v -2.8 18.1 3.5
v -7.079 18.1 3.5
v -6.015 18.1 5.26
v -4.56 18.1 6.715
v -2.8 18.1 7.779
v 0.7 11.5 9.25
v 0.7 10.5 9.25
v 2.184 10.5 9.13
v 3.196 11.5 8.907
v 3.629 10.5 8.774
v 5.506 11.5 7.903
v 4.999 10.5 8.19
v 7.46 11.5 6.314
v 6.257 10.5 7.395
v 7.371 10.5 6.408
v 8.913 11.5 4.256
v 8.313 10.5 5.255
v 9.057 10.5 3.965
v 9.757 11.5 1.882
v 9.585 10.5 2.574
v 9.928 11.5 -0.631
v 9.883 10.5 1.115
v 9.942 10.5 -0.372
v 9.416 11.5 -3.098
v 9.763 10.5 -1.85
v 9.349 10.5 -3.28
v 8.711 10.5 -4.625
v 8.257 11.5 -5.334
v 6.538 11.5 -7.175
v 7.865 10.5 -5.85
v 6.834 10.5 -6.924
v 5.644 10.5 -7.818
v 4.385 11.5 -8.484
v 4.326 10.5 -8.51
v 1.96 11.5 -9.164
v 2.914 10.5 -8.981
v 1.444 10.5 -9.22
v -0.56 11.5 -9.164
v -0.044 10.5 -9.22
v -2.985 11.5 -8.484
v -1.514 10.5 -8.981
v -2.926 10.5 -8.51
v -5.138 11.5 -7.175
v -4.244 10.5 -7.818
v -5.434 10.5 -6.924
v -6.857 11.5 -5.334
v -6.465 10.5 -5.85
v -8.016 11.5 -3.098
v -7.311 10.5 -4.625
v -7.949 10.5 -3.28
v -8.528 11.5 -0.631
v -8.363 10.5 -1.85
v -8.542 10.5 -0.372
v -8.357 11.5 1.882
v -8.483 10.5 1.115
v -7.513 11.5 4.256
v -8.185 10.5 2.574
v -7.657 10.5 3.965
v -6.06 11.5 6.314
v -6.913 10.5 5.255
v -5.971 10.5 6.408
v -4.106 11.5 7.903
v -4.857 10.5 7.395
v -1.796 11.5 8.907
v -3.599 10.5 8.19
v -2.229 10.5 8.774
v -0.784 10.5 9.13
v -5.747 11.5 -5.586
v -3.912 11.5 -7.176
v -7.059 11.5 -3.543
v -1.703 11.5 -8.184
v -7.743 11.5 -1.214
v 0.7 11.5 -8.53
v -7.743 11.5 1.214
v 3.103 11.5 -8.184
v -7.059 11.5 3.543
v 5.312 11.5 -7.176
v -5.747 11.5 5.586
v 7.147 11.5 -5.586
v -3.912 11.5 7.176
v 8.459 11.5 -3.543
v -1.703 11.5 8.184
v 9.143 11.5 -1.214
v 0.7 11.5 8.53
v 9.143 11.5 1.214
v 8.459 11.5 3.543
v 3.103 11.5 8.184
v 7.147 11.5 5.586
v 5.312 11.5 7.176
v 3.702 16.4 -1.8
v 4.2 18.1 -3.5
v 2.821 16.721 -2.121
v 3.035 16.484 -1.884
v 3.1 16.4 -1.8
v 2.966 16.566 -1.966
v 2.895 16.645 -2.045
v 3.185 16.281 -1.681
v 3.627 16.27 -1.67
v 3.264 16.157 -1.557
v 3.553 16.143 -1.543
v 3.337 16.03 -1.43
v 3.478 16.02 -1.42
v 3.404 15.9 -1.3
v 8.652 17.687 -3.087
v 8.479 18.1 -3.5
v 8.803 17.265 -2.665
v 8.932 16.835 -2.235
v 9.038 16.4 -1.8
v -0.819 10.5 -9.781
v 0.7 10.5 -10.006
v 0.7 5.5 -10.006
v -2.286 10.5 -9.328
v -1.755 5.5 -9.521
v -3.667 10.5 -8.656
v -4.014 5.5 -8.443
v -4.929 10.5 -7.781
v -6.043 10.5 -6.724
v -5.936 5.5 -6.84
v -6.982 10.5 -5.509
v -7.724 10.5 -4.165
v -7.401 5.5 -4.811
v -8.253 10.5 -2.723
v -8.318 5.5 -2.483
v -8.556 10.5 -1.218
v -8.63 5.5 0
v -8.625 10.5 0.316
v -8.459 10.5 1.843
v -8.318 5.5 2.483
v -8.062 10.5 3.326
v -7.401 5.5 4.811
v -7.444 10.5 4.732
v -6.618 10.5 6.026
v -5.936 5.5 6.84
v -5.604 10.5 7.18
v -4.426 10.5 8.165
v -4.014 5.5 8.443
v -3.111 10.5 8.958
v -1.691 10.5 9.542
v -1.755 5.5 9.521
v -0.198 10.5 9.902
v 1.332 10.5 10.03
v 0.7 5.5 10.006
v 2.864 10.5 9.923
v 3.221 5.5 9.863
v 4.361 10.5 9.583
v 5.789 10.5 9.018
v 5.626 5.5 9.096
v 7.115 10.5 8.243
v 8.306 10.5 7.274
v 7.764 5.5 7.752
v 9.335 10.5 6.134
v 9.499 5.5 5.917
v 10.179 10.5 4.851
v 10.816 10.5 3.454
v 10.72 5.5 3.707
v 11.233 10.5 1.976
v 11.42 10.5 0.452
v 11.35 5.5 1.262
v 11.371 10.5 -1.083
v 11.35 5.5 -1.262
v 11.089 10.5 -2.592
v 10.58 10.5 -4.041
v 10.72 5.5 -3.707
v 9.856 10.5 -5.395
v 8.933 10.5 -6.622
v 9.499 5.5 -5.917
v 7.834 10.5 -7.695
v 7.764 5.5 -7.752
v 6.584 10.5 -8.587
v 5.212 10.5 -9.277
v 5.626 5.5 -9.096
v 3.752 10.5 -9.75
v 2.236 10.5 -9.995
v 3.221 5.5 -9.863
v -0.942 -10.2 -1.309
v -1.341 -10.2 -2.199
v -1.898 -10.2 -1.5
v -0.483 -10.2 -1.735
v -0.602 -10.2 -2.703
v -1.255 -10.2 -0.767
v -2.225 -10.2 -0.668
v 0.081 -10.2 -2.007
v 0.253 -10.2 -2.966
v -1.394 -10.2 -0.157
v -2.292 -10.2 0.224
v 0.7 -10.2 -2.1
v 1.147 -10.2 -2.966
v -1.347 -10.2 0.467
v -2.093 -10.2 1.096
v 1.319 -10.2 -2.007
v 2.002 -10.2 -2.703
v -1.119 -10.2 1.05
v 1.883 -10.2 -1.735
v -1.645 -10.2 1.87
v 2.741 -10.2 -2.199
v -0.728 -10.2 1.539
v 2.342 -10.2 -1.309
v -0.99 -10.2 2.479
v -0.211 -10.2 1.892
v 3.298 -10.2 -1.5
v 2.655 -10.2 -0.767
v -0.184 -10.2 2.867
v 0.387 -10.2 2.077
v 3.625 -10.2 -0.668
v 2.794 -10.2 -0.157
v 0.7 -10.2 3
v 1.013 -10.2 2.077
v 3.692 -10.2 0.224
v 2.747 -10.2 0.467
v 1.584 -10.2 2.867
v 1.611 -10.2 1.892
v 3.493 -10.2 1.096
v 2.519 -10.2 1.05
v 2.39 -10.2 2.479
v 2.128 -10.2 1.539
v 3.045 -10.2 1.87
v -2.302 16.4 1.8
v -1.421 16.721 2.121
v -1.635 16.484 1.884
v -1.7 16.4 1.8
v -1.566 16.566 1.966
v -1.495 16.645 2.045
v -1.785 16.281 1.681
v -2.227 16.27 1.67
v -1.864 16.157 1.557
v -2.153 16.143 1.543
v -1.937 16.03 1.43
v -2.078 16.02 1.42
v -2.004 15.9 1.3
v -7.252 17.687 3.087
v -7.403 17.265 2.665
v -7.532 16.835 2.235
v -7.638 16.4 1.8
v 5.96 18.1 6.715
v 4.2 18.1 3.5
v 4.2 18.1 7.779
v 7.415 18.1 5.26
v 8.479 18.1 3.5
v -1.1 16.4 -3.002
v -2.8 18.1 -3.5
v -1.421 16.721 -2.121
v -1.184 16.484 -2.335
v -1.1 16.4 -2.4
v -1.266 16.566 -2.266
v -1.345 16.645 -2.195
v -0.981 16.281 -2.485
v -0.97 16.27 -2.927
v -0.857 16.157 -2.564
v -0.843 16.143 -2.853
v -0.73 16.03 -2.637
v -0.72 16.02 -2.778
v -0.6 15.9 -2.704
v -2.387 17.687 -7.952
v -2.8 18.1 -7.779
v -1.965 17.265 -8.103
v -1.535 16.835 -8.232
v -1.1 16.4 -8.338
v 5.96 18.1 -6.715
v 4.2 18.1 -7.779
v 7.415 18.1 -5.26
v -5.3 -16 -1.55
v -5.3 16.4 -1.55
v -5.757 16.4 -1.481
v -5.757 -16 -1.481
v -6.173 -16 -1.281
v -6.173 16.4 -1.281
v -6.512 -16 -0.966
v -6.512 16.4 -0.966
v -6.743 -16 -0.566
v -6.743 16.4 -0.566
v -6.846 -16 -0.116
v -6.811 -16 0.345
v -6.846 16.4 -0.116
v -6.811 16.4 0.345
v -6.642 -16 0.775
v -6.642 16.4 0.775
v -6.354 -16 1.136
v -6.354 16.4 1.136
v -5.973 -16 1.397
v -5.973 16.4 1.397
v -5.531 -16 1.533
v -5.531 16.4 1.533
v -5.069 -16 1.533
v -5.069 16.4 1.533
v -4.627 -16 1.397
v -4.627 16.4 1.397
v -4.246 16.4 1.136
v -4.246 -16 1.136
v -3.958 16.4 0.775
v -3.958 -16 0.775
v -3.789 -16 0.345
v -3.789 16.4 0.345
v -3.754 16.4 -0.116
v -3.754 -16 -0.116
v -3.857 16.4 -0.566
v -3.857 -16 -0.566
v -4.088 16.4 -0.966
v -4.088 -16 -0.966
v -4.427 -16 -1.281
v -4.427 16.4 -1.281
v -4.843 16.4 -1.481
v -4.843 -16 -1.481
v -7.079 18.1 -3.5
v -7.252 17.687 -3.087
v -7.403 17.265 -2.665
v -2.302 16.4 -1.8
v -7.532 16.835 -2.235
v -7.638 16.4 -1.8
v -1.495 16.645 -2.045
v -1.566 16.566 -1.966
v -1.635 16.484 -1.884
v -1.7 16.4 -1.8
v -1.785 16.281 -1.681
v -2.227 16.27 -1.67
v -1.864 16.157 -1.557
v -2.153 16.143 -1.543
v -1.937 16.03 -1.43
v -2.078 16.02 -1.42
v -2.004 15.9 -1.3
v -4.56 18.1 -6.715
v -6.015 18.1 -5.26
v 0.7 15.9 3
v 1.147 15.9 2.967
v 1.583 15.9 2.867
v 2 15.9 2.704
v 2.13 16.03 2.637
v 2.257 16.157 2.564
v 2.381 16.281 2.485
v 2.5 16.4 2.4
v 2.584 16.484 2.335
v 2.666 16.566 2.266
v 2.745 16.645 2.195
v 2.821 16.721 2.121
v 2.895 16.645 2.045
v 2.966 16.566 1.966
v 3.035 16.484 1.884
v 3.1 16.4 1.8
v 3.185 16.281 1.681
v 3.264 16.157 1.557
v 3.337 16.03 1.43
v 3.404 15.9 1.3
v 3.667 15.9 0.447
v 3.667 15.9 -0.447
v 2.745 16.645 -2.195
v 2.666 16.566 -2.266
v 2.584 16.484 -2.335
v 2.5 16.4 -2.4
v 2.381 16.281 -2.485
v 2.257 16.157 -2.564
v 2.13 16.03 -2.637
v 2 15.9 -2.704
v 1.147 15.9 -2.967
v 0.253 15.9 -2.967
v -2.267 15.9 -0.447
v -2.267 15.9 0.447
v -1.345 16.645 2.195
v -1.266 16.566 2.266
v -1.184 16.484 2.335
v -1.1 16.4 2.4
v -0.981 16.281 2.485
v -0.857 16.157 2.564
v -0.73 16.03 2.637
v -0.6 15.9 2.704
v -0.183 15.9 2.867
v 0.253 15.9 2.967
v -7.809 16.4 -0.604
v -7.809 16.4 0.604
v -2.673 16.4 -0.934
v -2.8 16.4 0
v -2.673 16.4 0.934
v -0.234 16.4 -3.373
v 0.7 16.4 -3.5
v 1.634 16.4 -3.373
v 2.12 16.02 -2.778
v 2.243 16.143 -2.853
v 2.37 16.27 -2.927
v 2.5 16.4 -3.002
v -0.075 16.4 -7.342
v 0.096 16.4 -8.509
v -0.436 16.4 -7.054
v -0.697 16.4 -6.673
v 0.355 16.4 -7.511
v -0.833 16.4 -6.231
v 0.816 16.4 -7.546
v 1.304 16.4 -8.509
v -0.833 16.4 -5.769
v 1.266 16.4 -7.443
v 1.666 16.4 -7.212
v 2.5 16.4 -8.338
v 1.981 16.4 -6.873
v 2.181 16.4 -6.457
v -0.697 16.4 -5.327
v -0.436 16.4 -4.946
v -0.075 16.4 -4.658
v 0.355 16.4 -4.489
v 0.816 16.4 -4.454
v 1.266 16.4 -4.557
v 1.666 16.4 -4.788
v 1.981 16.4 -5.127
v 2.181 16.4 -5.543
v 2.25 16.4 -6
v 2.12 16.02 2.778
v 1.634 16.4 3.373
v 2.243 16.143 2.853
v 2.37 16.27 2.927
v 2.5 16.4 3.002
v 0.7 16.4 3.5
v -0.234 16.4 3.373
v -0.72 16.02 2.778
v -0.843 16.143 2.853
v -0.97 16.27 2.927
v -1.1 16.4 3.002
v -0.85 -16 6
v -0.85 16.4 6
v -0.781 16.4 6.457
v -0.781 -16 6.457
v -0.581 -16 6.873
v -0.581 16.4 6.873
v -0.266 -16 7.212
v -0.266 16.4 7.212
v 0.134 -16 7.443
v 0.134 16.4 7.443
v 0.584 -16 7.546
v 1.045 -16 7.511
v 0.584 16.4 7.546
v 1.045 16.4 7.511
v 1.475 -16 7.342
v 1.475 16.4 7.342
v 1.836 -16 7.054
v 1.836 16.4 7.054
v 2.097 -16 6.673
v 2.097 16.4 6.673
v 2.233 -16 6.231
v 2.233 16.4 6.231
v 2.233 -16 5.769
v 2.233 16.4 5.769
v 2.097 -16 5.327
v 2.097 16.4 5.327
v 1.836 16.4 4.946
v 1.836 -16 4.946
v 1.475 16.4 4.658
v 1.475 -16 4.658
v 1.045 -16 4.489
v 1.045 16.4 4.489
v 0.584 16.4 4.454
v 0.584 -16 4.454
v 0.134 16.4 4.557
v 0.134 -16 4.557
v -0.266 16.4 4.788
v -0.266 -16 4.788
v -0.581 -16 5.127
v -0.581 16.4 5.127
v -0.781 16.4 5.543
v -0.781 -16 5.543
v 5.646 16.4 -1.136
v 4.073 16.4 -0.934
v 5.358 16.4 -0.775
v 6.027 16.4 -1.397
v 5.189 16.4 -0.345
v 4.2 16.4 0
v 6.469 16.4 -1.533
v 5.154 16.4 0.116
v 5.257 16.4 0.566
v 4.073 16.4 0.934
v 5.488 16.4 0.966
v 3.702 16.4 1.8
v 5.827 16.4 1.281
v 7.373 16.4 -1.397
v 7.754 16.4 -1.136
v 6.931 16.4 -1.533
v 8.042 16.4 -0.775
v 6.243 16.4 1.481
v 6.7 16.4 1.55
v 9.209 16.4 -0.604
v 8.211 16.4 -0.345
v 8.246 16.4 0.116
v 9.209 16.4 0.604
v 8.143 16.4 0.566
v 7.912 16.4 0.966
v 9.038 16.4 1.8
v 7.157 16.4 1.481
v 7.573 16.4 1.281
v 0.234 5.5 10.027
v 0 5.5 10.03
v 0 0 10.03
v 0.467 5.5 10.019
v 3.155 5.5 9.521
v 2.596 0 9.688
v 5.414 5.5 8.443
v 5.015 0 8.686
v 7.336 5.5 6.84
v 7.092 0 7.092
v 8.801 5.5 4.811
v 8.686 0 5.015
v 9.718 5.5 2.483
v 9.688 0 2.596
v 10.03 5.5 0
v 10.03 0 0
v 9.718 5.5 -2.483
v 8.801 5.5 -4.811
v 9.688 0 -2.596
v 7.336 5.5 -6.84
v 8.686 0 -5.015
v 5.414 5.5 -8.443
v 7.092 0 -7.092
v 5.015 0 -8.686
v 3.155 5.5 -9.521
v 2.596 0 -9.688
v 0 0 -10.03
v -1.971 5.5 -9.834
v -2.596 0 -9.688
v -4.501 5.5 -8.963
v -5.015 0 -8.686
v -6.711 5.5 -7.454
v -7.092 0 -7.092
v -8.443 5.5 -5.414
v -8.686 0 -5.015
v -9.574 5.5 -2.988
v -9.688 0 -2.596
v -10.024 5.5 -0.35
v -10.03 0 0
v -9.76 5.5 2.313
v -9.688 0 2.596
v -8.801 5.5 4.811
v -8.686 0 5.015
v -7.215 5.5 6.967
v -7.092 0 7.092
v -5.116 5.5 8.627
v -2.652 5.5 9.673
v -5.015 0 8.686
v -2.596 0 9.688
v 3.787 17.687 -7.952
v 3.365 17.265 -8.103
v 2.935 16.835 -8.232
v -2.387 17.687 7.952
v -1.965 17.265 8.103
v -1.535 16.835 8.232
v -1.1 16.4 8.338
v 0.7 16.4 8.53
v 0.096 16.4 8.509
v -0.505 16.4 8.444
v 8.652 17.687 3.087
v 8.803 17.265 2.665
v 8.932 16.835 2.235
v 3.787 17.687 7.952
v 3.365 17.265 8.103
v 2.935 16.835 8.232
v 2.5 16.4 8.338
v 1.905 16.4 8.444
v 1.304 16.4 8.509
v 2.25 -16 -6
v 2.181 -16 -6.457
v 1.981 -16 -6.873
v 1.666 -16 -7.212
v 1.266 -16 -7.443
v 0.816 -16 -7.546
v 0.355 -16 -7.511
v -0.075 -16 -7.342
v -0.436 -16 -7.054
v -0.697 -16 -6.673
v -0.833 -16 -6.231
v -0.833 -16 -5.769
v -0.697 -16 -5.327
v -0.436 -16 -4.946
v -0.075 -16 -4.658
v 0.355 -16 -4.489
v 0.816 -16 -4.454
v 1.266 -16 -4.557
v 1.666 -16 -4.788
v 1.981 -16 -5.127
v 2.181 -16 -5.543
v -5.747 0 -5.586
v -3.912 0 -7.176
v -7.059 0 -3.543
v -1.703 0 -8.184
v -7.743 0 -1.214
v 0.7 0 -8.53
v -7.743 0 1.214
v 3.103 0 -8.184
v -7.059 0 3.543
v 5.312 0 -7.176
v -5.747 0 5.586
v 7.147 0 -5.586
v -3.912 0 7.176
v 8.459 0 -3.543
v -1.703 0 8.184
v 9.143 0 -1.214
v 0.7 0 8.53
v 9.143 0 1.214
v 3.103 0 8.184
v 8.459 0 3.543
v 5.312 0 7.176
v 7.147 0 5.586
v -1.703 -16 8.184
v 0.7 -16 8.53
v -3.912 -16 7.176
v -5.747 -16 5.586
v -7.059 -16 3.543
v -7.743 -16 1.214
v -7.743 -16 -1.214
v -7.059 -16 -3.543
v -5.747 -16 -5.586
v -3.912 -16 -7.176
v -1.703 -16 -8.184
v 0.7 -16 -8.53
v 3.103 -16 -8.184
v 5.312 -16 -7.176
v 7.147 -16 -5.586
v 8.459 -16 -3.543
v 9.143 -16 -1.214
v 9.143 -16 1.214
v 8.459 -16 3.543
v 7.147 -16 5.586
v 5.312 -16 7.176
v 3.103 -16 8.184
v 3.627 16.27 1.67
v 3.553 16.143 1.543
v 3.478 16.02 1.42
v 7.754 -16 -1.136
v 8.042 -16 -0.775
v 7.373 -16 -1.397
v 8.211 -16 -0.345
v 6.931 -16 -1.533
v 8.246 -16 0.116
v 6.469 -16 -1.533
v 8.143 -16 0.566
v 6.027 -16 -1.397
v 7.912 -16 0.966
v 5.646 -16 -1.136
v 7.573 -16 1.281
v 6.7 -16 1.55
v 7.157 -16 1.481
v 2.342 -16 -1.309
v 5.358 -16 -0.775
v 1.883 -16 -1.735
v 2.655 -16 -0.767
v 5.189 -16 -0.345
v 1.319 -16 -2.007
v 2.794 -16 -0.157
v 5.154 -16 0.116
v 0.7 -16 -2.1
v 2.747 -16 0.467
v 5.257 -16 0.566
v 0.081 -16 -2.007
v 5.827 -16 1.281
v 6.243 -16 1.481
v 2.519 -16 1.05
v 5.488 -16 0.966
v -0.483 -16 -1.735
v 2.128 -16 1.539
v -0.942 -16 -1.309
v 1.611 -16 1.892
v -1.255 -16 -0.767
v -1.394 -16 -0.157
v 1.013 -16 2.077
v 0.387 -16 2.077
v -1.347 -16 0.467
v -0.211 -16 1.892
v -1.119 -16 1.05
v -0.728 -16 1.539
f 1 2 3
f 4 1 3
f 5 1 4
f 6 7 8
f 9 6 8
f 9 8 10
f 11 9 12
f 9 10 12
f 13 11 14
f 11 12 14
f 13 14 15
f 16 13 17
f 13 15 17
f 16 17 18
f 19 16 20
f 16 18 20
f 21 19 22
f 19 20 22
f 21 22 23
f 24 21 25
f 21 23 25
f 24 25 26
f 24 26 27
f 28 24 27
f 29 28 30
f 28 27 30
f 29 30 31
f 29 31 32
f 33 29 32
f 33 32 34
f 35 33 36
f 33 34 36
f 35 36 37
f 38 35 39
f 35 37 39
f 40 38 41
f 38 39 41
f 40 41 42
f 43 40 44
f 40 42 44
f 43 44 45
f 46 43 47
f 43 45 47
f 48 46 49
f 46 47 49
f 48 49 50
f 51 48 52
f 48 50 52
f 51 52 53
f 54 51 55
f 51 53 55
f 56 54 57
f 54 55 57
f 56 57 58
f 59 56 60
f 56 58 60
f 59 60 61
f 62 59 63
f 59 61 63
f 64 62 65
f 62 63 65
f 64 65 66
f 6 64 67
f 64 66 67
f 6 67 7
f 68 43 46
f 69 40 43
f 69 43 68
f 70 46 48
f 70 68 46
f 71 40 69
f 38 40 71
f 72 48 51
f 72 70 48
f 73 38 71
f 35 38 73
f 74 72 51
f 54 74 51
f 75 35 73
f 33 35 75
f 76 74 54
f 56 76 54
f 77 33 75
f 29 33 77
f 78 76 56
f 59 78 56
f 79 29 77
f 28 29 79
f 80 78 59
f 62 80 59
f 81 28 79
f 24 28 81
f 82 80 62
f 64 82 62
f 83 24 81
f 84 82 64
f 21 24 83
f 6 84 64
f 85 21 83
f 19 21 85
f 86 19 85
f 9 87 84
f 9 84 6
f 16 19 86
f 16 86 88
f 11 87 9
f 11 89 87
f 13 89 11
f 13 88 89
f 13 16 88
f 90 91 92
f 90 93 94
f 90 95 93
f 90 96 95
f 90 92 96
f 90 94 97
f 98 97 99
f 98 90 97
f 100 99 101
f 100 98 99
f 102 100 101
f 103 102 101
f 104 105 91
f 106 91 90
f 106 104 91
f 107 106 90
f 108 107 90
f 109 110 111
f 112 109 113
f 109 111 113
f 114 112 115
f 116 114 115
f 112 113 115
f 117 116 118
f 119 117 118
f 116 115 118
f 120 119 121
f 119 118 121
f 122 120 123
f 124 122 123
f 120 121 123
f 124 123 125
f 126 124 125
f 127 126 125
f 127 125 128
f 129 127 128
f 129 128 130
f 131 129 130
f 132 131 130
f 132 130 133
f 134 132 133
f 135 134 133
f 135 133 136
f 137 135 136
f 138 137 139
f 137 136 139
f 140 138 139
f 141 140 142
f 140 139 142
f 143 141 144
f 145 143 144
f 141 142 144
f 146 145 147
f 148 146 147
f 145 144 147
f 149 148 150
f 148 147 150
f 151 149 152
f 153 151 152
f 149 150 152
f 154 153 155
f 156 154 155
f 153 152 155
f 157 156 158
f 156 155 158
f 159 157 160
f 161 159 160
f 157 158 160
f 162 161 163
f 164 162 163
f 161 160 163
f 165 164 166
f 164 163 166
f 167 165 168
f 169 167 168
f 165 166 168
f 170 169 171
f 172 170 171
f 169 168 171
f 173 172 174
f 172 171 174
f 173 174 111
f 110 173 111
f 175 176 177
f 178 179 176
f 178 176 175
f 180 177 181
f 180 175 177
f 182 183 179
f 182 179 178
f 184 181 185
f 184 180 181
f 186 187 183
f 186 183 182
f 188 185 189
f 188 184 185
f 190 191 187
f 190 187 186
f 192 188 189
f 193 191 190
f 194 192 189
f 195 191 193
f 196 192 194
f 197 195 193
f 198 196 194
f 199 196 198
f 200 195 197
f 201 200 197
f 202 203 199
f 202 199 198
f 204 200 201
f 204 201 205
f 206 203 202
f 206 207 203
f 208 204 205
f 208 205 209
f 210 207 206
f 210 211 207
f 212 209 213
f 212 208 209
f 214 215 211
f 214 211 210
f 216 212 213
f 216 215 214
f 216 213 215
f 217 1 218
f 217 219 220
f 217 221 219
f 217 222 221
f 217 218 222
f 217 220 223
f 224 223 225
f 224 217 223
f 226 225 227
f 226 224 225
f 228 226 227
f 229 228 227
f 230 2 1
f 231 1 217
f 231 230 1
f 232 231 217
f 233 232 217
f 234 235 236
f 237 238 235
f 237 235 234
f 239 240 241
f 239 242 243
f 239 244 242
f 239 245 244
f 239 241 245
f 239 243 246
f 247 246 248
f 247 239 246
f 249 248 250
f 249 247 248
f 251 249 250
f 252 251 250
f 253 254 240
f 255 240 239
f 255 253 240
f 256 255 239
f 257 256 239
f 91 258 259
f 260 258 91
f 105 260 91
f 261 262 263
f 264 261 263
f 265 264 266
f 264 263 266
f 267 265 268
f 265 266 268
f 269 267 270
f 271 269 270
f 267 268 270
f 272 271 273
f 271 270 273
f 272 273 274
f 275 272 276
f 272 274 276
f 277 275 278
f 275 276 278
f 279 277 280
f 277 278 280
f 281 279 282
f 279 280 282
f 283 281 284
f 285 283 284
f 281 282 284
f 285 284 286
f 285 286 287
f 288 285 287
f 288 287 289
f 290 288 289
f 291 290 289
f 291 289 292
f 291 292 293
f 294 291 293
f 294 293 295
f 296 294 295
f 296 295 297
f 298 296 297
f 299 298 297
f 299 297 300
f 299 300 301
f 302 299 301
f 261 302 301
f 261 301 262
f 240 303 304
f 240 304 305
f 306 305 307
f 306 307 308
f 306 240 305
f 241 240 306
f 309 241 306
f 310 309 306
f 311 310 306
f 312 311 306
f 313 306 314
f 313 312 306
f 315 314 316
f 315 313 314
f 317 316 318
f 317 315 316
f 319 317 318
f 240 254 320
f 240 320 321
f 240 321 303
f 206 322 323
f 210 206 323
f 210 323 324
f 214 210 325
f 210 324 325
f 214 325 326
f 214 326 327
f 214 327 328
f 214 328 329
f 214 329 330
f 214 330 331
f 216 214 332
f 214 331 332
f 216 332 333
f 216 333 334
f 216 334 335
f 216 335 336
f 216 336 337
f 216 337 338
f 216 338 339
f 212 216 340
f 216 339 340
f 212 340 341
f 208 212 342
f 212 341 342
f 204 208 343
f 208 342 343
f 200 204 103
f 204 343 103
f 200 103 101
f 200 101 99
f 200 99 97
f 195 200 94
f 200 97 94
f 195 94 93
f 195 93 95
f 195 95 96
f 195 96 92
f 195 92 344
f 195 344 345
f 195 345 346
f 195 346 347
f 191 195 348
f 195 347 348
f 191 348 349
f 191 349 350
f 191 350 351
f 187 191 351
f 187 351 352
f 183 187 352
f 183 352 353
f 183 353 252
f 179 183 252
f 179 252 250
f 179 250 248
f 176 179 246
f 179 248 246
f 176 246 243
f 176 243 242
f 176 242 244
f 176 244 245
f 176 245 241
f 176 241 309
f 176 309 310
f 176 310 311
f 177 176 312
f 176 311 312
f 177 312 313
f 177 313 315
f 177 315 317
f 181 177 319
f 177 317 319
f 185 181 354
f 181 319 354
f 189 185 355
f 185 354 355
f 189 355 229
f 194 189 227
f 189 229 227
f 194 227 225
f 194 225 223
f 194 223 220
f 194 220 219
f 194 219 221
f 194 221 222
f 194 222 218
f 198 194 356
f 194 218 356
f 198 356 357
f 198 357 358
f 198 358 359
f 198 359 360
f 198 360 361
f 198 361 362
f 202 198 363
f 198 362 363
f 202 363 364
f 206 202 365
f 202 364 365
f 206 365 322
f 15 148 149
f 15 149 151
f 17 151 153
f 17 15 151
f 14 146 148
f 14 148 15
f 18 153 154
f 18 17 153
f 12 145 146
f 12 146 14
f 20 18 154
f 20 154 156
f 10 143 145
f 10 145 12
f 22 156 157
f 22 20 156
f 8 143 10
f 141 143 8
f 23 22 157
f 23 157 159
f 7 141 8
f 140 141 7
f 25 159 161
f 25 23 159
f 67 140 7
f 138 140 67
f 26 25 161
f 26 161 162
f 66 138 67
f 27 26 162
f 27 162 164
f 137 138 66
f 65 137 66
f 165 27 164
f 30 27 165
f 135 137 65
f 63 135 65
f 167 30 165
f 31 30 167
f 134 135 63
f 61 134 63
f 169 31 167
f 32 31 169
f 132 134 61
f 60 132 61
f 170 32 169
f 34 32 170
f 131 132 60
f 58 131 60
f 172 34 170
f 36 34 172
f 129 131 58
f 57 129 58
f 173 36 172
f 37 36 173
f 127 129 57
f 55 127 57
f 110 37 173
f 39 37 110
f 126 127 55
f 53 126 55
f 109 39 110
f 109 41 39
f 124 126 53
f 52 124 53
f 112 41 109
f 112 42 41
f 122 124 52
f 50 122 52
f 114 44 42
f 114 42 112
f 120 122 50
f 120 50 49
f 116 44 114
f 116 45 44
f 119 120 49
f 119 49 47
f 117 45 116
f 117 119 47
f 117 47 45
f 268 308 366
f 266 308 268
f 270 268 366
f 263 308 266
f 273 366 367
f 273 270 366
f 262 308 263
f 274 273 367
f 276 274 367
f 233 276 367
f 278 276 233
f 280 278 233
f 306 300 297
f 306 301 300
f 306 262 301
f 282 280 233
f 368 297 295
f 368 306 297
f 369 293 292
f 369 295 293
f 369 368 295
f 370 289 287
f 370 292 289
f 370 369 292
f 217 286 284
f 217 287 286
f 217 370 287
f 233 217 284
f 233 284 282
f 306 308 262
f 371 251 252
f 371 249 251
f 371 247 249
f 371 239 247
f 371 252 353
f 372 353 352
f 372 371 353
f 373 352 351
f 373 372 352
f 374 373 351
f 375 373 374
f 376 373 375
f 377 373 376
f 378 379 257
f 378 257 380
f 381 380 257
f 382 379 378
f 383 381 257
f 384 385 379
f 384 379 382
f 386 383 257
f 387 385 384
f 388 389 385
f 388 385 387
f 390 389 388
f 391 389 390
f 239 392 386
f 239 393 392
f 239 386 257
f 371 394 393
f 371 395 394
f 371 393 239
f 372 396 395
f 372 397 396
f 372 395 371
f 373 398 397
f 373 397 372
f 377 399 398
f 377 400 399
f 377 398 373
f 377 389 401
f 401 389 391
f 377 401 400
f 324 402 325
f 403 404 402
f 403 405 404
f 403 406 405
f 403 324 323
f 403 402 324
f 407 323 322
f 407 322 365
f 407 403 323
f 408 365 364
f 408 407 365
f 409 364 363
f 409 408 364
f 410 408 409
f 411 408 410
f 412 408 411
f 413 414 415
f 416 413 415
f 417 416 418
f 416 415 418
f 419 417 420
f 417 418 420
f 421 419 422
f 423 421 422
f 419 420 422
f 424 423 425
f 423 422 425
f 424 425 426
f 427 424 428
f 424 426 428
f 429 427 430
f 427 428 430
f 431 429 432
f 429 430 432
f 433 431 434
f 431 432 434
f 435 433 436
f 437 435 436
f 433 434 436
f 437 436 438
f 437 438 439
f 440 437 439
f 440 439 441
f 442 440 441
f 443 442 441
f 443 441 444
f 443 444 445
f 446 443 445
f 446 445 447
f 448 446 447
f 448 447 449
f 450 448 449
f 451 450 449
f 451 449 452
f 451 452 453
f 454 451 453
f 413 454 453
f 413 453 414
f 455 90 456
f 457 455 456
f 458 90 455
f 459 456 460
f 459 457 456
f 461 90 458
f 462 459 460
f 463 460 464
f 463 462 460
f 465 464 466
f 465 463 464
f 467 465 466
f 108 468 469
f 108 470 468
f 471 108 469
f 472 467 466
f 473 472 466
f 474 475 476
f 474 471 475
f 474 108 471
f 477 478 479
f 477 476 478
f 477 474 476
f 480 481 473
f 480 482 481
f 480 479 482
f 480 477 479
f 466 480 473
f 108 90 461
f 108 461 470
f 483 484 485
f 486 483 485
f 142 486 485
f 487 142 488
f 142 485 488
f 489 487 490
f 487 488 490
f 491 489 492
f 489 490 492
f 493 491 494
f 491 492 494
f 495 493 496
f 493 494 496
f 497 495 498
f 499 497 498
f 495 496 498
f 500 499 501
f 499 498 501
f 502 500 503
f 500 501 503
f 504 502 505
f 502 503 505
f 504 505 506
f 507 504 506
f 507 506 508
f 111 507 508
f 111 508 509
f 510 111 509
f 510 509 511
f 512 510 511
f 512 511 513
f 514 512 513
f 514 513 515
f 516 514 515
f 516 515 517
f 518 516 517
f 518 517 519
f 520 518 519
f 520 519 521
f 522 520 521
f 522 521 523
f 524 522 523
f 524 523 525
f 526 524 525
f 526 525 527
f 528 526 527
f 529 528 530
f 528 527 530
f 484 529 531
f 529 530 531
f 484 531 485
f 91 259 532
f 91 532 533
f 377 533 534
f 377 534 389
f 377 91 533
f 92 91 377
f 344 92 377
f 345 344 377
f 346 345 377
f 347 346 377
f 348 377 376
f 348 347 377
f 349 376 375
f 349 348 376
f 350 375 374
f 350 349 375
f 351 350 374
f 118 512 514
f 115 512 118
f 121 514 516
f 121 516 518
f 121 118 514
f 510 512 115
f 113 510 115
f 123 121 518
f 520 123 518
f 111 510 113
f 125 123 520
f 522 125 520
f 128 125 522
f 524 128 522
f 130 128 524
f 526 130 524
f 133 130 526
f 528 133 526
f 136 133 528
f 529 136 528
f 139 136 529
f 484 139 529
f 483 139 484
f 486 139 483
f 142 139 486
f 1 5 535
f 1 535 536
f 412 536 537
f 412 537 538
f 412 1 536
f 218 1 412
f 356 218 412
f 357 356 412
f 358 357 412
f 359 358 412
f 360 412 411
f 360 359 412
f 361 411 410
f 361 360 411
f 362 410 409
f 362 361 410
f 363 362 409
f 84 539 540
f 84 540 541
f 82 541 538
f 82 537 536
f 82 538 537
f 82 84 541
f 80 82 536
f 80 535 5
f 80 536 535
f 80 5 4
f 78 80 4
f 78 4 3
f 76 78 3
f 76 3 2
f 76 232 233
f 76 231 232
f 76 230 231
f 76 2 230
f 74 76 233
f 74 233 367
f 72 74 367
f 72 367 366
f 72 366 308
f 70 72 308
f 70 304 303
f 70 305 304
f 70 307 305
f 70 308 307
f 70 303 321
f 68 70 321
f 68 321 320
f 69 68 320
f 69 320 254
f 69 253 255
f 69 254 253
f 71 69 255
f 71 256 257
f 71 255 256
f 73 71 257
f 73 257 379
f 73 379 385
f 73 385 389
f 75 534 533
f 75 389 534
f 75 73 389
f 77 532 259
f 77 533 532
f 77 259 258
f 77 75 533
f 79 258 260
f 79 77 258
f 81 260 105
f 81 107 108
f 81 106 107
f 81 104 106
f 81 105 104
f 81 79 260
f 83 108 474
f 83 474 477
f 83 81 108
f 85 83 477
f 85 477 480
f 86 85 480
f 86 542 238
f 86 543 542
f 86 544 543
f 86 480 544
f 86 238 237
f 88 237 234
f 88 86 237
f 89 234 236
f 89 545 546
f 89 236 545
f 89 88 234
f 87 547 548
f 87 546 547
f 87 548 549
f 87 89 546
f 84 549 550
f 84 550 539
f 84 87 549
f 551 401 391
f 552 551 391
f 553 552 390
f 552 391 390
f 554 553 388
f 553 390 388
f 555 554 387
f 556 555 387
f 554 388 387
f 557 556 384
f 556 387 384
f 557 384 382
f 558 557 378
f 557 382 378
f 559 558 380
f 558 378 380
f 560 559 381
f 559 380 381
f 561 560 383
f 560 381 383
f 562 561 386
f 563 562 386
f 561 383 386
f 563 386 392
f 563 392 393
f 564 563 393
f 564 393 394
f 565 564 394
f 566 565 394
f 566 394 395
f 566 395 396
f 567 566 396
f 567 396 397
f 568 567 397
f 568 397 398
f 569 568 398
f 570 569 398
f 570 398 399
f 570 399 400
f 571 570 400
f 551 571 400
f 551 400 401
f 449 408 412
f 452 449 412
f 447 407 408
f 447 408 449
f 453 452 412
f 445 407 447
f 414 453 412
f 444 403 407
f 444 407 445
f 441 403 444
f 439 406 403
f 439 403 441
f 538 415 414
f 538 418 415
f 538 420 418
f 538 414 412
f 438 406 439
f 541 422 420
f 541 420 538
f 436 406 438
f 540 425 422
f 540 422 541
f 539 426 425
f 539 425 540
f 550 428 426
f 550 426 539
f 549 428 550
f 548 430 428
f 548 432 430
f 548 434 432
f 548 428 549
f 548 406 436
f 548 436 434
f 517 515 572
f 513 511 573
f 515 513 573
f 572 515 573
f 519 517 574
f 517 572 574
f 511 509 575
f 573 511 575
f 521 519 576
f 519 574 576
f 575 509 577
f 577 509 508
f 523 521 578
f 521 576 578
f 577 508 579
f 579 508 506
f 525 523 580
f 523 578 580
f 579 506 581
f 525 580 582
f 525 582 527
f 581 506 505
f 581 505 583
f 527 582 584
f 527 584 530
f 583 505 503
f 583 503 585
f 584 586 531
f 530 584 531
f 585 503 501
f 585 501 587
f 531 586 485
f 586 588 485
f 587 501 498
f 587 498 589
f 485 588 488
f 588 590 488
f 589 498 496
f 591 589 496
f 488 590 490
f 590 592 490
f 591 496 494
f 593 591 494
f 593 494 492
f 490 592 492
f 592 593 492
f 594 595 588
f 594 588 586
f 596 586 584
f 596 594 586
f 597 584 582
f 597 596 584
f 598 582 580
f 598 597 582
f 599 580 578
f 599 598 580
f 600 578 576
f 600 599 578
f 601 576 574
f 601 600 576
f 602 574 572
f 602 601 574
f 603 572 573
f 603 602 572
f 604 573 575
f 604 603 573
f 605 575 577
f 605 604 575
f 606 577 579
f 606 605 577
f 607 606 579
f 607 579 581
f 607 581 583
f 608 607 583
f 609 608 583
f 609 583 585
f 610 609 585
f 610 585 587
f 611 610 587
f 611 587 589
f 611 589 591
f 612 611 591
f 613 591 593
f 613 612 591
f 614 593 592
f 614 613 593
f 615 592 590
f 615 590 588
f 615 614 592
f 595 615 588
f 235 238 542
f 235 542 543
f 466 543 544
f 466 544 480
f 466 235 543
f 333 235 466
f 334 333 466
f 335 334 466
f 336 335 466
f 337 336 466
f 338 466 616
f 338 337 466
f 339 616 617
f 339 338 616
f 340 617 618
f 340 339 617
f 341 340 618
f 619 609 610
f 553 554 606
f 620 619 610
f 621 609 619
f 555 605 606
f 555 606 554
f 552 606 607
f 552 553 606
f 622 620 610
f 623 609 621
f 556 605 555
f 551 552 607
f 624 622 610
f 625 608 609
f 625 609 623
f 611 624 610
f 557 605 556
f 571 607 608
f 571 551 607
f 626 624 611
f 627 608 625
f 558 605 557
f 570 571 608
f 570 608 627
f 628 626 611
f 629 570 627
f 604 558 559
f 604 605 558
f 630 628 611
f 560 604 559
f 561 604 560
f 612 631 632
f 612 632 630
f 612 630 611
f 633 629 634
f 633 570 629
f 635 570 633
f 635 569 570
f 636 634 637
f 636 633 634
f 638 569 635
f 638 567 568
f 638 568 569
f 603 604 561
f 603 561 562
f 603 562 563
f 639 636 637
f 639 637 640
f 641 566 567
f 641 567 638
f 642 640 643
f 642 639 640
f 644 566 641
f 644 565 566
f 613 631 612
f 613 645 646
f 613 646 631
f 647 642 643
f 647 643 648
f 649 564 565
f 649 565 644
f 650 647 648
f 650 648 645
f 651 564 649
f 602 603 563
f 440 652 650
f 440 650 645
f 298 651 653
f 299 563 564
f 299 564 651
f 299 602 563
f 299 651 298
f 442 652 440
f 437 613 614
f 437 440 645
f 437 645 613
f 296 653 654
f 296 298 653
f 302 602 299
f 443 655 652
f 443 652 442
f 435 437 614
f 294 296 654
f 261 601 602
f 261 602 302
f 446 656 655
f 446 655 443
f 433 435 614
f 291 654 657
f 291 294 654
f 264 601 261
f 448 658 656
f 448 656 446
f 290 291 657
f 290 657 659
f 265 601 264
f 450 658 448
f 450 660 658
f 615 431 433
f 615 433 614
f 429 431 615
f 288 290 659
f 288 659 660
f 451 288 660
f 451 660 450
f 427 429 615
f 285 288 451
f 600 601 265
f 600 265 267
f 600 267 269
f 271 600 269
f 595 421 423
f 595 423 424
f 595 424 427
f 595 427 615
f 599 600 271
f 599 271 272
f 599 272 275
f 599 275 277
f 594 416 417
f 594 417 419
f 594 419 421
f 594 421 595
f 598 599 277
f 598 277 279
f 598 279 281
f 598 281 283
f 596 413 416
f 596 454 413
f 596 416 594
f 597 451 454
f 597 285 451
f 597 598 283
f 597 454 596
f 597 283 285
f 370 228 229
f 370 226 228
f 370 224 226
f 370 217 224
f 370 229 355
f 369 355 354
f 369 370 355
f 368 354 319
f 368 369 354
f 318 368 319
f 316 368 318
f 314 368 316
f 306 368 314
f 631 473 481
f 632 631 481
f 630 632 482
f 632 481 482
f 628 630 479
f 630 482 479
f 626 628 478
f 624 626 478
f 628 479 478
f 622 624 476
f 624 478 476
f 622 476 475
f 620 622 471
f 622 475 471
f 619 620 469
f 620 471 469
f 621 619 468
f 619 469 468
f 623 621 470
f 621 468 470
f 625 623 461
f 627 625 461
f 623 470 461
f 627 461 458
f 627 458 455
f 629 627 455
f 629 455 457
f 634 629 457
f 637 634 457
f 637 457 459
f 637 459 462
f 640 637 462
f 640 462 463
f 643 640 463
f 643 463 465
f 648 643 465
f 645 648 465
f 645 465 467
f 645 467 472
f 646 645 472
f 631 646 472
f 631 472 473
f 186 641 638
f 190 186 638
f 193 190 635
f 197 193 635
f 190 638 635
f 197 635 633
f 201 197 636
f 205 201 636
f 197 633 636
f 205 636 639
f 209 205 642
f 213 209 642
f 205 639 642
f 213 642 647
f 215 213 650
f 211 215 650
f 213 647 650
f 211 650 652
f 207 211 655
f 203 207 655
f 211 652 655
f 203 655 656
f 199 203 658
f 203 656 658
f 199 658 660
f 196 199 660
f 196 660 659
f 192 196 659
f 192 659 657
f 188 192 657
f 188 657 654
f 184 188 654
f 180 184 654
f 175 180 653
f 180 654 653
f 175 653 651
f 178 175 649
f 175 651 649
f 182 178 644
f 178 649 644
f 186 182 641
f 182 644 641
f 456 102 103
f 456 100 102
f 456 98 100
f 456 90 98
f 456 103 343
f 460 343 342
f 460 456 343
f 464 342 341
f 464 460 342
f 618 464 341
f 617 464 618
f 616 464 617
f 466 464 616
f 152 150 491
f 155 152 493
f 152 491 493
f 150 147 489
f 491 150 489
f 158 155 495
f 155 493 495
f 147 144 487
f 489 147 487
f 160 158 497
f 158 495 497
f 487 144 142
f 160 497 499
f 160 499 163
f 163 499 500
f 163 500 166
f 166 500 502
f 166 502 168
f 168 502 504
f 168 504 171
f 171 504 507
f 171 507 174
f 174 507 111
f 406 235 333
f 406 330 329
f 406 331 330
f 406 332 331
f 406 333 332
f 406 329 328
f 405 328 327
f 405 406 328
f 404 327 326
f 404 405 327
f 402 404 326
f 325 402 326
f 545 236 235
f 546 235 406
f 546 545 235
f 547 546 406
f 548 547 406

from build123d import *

# Parameters (mm, degrees)
SKETCH1_R            = 10.03
BOSS_EXTRUDE11_DEPTH = 5.5
SKETCH20_R           = 10.03
BOSS_EXTRUDE12_DEPTH = 5
SKETCH21_R           = 9.25
BOSS_EXTRUDE13_DEPTH = 1
SKETCH22_R           = 8.53
BOSS_EXTRUDE14_DEPTH = 6.6
BOSS_EXTRUDE15_START = 16
SKETCH30_R           = 8.53
BOSS_EXTRUDE15_DEPTH = 16
SKETCH31_R           = 1.55
CUT_EXTRUDE12_DEPTH  = 34.1
SKETCH33_R           = 2.1
CUT_EXTRUDE14_DEPTH  = 5.8
SKETCH36_R           = 3
CUT_EXTRUDE18_DEPTH  = 28.3
SKETCH37_W           = 9.5
SKETCH37_H           = 7
CUT_EXTRUDE19_DEPTH  = 1.7
CIRPATTERN1_COUNT    = 4
CHAMFER1_SIZE        = 1.7
CHAMFER2_SIZE        = 0.5


with BuildPart() as part:
    # Sketch1 → Boss-Extrude11 (new body)
    with BuildSketch(Plane(origin=(0, 0, 0), x_dir=(1, 0, 0), z_dir=(0, 1, 0))):
        with Locations(Location((0, 0, 0), (0, 0, 270))):
            Circle(SKETCH1_R)
    extrude(amount=BOSS_EXTRUDE11_DEPTH)

    # Sketch20 → Boss-Extrude12 (add)
    with BuildSketch(Plane(origin=(0, 5.5, 0), x_dir=(1, 0, 0), z_dir=(0, 1, 0))):
        with Locations(Location((1.4, 0, 0), (0, 0, 94.001961682))):
            Circle(SKETCH20_R)
    extrude(amount=BOSS_EXTRUDE12_DEPTH)

    # Sketch21 → Boss-Extrude13 (add)
    with BuildSketch(Plane(origin=(0, 10.5, 0), x_dir=(1, 0, 0), z_dir=(0, 1, 0))):
        with Locations(Location((0.7, 0, 0), (0, 0, 270))):
            Circle(SKETCH21_R)
    extrude(amount=BOSS_EXTRUDE13_DEPTH)

    # Sketch22 → Boss-Extrude14 (add)
    with BuildSketch(Plane(origin=(0, 11.5, 0), x_dir=(1, 0, 0), z_dir=(0, 1, 0))):
        with Locations(Location((0.7, 0, 0), (0, 0, 270))):
            Circle(SKETCH22_R)
    extrude(amount=BOSS_EXTRUDE14_DEPTH)

    # Sketch30 → Boss-Extrude15 (add)
    with BuildSketch(Plane.XZ.offset(BOSS_EXTRUDE15_START)):
        with Locations(Location((0.7, 0, 0), (0, 0, 90))):
            Circle(SKETCH30_R)
    extrude(amount=-BOSS_EXTRUDE15_DEPTH)

    # Sketch31 → Cut-Extrude12 (cut)
    with BuildSketch(Plane(origin=(0, 18.1, 0), x_dir=(1, 0, 0), z_dir=(0, 1, 0))):
        with Locations(Location((6.7, 0, 0), (0, 0, 270))):
            Circle(SKETCH31_R)
    cut_extrude12 = extrude(amount=-CUT_EXTRUDE12_DEPTH, mode=Mode.SUBTRACT)

    # Sketch33 → Cut-Extrude14 (cut)
    with BuildSketch(Plane.XZ.offset(16)):
        with Locations(Location((0.7, 0, 0), (0, 0, 270))):
            Circle(SKETCH33_R)
    extrude(amount=-CUT_EXTRUDE14_DEPTH, mode=Mode.SUBTRACT)

    # Sketch36 → Cut-Extrude18 (cut)
    with BuildSketch(Plane(origin=(0, 18.1, 0), x_dir=(1, 0, 0), z_dir=(0, 1, 0))):
        with Locations(Location((0.7, 0, 0), (0, 0, 270))):
            Circle(SKETCH36_R)
    extrude(amount=-CUT_EXTRUDE18_DEPTH, mode=Mode.SUBTRACT)

    # Sketch37 → Cut-Extrude19 (cut)
    with BuildSketch(Plane(origin=(0, 18.1, 0), x_dir=(1, 0, 0), z_dir=(0, 1, 0))):
        with Locations((5.45, 0)):
            Rectangle(SKETCH37_W, SKETCH37_H)
    cut_extrude19 = extrude(amount=-CUT_EXTRUDE19_DEPTH, mode=Mode.SUBTRACT)

    # CirPattern1: Cut-Extrude12, Cut-Extrude19 ×4 about axis
    cirpattern1_axis = Axis((0.7, 0, 0), (0, 1, 0))
    add([cut_extrude12.rotate(cirpattern1_axis, i * 360 / CIRPATTERN1_COUNT) for i in range(1, CIRPATTERN1_COUNT)], mode=Mode.SUBTRACT)
    add([cut_extrude19.rotate(cirpattern1_axis, i * 360 / CIRPATTERN1_COUNT) for i in range(1, CIRPATTERN1_COUNT)], mode=Mode.SUBTRACT)

    # Chamfer1
    # the kernel refuses this chamfer: 1.7 mm, written as the material it adds along each edge
    with BuildSketch(Plane(origin=(12.85073632, 16.4, -3.5), x_dir=(0, 0.9996219169112968, -0.027495876610586365), z_dir=(-1, 0, 0))) as chamfer1_piece_1_section:
        Polygon((CHAMFER1_SIZE * 0.999621916911, -CHAMFER1_SIZE * 0.0274958766106), (-CHAMFER1_SIZE * 0.0274958766106, -CHAMFER1_SIZE * 0.999621916911), (0, 0), align=None)
    chamfer1_piece_1 = extrude(amount=8.65073632, mode=Mode.PRIVATE)
    chamfer1_piece_1 = chamfer1_piece_1 & Plane(origin=(0.7, 16.951076754, 0), x_dir=(0, 0, 1), z_dir=(0, -1, 0)) * Cylinder(8.53, 25, mode=Mode.PRIVATE)
    chamfer1_piece_1 = split(chamfer1_piece_1, bisect_by=Plane(origin=(6.450066767, 18.1, -2.924017163), z_dir=(0, -1, 0)), keep=Keep.TOP, mode=Mode.PRIVATE)
    add(chamfer1_piece_1)
    with BuildSketch(Plane(origin=(4.2, 16.4, 3.5), x_dir=(0, 0.9996219169112968, 0.027495876610581792), z_dir=(1, 0, 0))) as chamfer1_piece_2_section:
        Polygon((CHAMFER1_SIZE * 0.999621916911, -CHAMFER1_SIZE * 0.0274958766106), (-CHAMFER1_SIZE * 0.0274958766106, -CHAMFER1_SIZE * 0.999621916911), (0, 0), align=None)
    chamfer1_piece_2 = extrude(amount=8.65073632, mode=Mode.PRIVATE)
    chamfer1_piece_2 = chamfer1_piece_2 & Plane(origin=(0.7, 16.951076754, 0), x_dir=(0, 0, 1), z_dir=(0, -1, 0)) * Cylinder(8.53, 25, mode=Mode.PRIVATE)
    chamfer1_piece_2 = split(chamfer1_piece_2, bisect_by=Plane(origin=(6.450066768, 18.1, 2.924017163), z_dir=(0, -1, 0)), keep=Keep.TOP, mode=Mode.PRIVATE)
    add(chamfer1_piece_2)
    with BuildSketch(Plane(origin=(-2.8, 16.4, -12.15073632), x_dir=(-0.027495876610586365, 0.9996219169112968, 0), z_dir=(0, 0, 1))) as chamfer1_piece_3_section:
        Polygon((CHAMFER1_SIZE * 0.999621916911, -CHAMFER1_SIZE * 0.0274958766106), (-CHAMFER1_SIZE * 0.0274958766106, -CHAMFER1_SIZE * 0.999621916911), (0, 0), align=None)
    chamfer1_piece_3 = extrude(amount=8.65073632, mode=Mode.PRIVATE)
    chamfer1_piece_3 = chamfer1_piece_3 & Plane(origin=(0.7, 16.951076754, 0), x_dir=(0, 0, 1), z_dir=(0, -1, 0)) * Cylinder(8.53, 25, mode=Mode.PRIVATE)
    chamfer1_piece_3 = split(chamfer1_piece_3, bisect_by=Plane(origin=(-2.224017163, 18.1, -5.750066767), z_dir=(0, -1, 0)), keep=Keep.TOP, mode=Mode.PRIVATE)
    add(chamfer1_piece_3)
    with BuildSketch(Plane(origin=(-2.8, 16.4, -3.5), x_dir=(0, 0.9996219169112968, -0.027495876610586365), z_dir=(-1, 0, 0))) as chamfer1_piece_4_section:
        Polygon((CHAMFER1_SIZE * 0.999621916911, -CHAMFER1_SIZE * 0.0274958766106), (-CHAMFER1_SIZE * 0.0274958766106, -CHAMFER1_SIZE * 0.999621916911), (0, 0), align=None)
    chamfer1_piece_4 = extrude(amount=8.65073632, mode=Mode.PRIVATE)
    chamfer1_piece_4 = chamfer1_piece_4 & Plane(origin=(0.7, 16.951076754, 0), x_dir=(0, 0, 1), z_dir=(0, -1, 0)) * Cylinder(8.53, 25, mode=Mode.PRIVATE)
    chamfer1_piece_4 = split(chamfer1_piece_4, bisect_by=Plane(origin=(-5.050066768, 18.1, -2.924017163), z_dir=(0, -1, 0)), keep=Keep.TOP, mode=Mode.PRIVATE)
    add(chamfer1_piece_4)
    with BuildSketch(Plane(origin=(-11.45073632, 16.4, 3.5), x_dir=(0, 0.9996219169112968, 0.027495876610586365), z_dir=(1, 0, 0))) as chamfer1_piece_5_section:
        Polygon((CHAMFER1_SIZE * 0.999621916911, -CHAMFER1_SIZE * 0.0274958766106), (-CHAMFER1_SIZE * 0.0274958766106, -CHAMFER1_SIZE * 0.999621916911), (0, 0), align=None)
    chamfer1_piece_5 = extrude(amount=8.65073632, mode=Mode.PRIVATE)
    chamfer1_piece_5 = chamfer1_piece_5 & Plane(origin=(0.7, 16.951076754, 0), x_dir=(0, 0, 1), z_dir=(0, -1, 0)) * Cylinder(8.53, 25, mode=Mode.PRIVATE)
    chamfer1_piece_5 = split(chamfer1_piece_5, bisect_by=Plane(origin=(-5.050066767, 18.1, 2.924017163), z_dir=(0, -1, 0)), keep=Keep.TOP, mode=Mode.PRIVATE)
    add(chamfer1_piece_5)
    with BuildSketch(Plane(origin=(-2.8, 16.4, 3.5), x_dir=(-0.027495876610586365, 0.9996219169112968, 0), z_dir=(0, 0, 1))) as chamfer1_piece_6_section:
        Polygon((CHAMFER1_SIZE * 0.999621916911, -CHAMFER1_SIZE * 0.0274958766106), (-CHAMFER1_SIZE * 0.0274958766106, -CHAMFER1_SIZE * 0.999621916911), (0, 0), align=None)
    chamfer1_piece_6 = extrude(amount=8.65073632, mode=Mode.PRIVATE)
    chamfer1_piece_6 = chamfer1_piece_6 & Plane(origin=(0.7, 16.951076754, 0), x_dir=(0, 0, 1), z_dir=(0, -1, 0)) * Cylinder(8.53, 25, mode=Mode.PRIVATE)
    chamfer1_piece_6 = split(chamfer1_piece_6, bisect_by=Plane(origin=(-2.224017163, 18.1, 5.750066768), z_dir=(0, -1, 0)), keep=Keep.TOP, mode=Mode.PRIVATE)
    add(chamfer1_piece_6)
    with BuildSketch(Plane(origin=(4.2, 16.4, 12.15073632), x_dir=(0.027495876610586365, 0.9996219169112968, 0), z_dir=(0, 0, -1))) as chamfer1_piece_7_section:
        Polygon((CHAMFER1_SIZE * 0.999621916911, -CHAMFER1_SIZE * 0.0274958766106), (-CHAMFER1_SIZE * 0.0274958766106, -CHAMFER1_SIZE * 0.999621916911), (0, 0), align=None)
    chamfer1_piece_7 = extrude(amount=8.65073632, mode=Mode.PRIVATE)
    chamfer1_piece_7 = chamfer1_piece_7 & Plane(origin=(0.7, 16.951076754, 0), x_dir=(0, 0, 1), z_dir=(0, -1, 0)) * Cylinder(8.53, 25, mode=Mode.PRIVATE)
    chamfer1_piece_7 = split(chamfer1_piece_7, bisect_by=Plane(origin=(3.624017163, 18.1, 5.750066767), z_dir=(0, -1, 0)), keep=Keep.TOP, mode=Mode.PRIVATE)
    add(chamfer1_piece_7)
    with BuildSketch(Plane(origin=(4.2, 16.4, -3.5), x_dir=(0.027495876610586365, 0.9996219169112968, 0), z_dir=(0, 0, -1))) as chamfer1_piece_8_section:
        Polygon((CHAMFER1_SIZE * 0.999621916911, -CHAMFER1_SIZE * 0.0274958766106), (-CHAMFER1_SIZE * 0.0274958766106, -CHAMFER1_SIZE * 0.999621916911), (0, 0), align=None)
    chamfer1_piece_8 = extrude(amount=8.65073632, mode=Mode.PRIVATE)
    chamfer1_piece_8 = chamfer1_piece_8 & Plane(origin=(0.7, 16.951076754, 0), x_dir=(0, 0, 1), z_dir=(0, -1, 0)) * Cylinder(8.53, 25, mode=Mode.PRIVATE)
    chamfer1_piece_8 = split(chamfer1_piece_8, bisect_by=Plane(origin=(3.624017163, 18.1, -5.750066768), z_dir=(0, -1, 0)), keep=Keep.TOP, mode=Mode.PRIVATE)
    add(chamfer1_piece_8)
    with BuildSketch(Plane(origin=(12.85073632, 16.4, -3.5), x_dir=(0, 0.9996219169112968, -0.027495876610586365), z_dir=(-1, 0, 0))) as chamfer1_piece_9a_section:
        Polygon((CHAMFER1_SIZE * 0.999621916911, -CHAMFER1_SIZE * 0.0274958766106), (-CHAMFER1_SIZE * 0.0274958766106, -CHAMFER1_SIZE * 0.999621916911), (0, 0), align=None)
    chamfer1_piece_9a = extrude(amount=13.022597399, mode=Mode.PRIVATE)
    chamfer1_piece_9a = split(chamfer1_piece_9a, bisect_by=Plane(origin=(2.33024723, 18.1, -3.085534958), z_dir=(0, -1, 0)), keep=Keep.TOP, mode=Mode.PRIVATE)
    chamfer1_piece_9a = split(chamfer1_piece_9a, bisect_by=Plane(origin=(4.2, 17.035605809, -3.085534958), z_dir=(-1, 0, 0)), keep=Keep.TOP, mode=Mode.PRIVATE)
    chamfer1_piece_9a = chamfer1_piece_9a - Plane(origin=(0.7, 17.035605809, 0), x_dir=(0, 0, 1), z_dir=(0, 1, 0)) * Cylinder(3, 33, mode=Mode.PRIVATE)
    with BuildSketch(Plane(origin=(4.2, 16.4, 0.87186108), x_dir=(0.027495876610586365, 0.9996219169112968, 0), z_dir=(0, 0, -1))) as chamfer1_piece_9b_section:
        Polygon((CHAMFER1_SIZE * 0.999621916911, -CHAMFER1_SIZE * 0.0274958766106), (-CHAMFER1_SIZE * 0.0274958766106, -CHAMFER1_SIZE * 0.999621916911), (0, 0), align=None)
    chamfer1_piece_9b = extrude(amount=13.022597399, mode=Mode.PRIVATE)
    chamfer1_piece_9b = split(chamfer1_piece_9b, bisect_by=Plane(origin=(3.785535078, 17.035605902, -3.5), z_dir=(0, 0, 1)), keep=Keep.TOP, mode=Mode.PRIVATE)
    chamfer1_piece_9b = split(chamfer1_piece_9b, bisect_by=Plane(origin=(3.785535078, 18.1, -1.630247283), z_dir=(0, -1, 0)), keep=Keep.TOP, mode=Mode.PRIVATE)
    chamfer1_piece_9b = chamfer1_piece_9b - Plane(origin=(0.7, 17.035605902, 0), x_dir=(0, 0, 1), z_dir=(0, 1, 0)) * Cylinder(3, 33, mode=Mode.PRIVATE)
    chamfer1_piece_9 = chamfer1_piece_9a & chamfer1_piece_9b
    add(chamfer1_piece_9)
    with BuildSketch(Plane(origin=(4.2, 16.4, 12.15073632), x_dir=(0.027495876610586365, 0.9996219169112968, 0), z_dir=(0, 0, -1))) as chamfer1_piece_10a_section:
        Polygon((CHAMFER1_SIZE * 0.999621916911, -CHAMFER1_SIZE * 0.0274958766106), (-CHAMFER1_SIZE * 0.0274958766106, -CHAMFER1_SIZE * 0.999621916911), (0, 0), align=None)
    chamfer1_piece_10a = extrude(amount=13.022597399, mode=Mode.PRIVATE)
    chamfer1_piece_10a = split(chamfer1_piece_10a, bisect_by=Plane(origin=(3.785534958, 18.1, 1.63024723), z_dir=(0, -1, 0)), keep=Keep.TOP, mode=Mode.PRIVATE)
    chamfer1_piece_10a = split(chamfer1_piece_10a, bisect_by=Plane(origin=(3.785534958, 17.035605809, 3.5), z_dir=(0, 0, -1)), keep=Keep.TOP, mode=Mode.PRIVATE)
    chamfer1_piece_10a = chamfer1_piece_10a - Plane(origin=(0.7, 17.035605809, 0), x_dir=(0, 0, 1), z_dir=(0, 1, 0)) * Cylinder(3, 33, mode=Mode.PRIVATE)
    with BuildSketch(Plane(origin=(-0.17186108, 16.4, 3.5), x_dir=(0, 0.9996219169112968, 0.027495876610586365), z_dir=(1, 0, 0))) as chamfer1_piece_10b_section:
        Polygon((CHAMFER1_SIZE * 0.999621916911, -CHAMFER1_SIZE * 0.0274958766106), (-CHAMFER1_SIZE * 0.0274958766106, -CHAMFER1_SIZE * 0.999621916911), (0, 0), align=None)
    chamfer1_piece_10b = extrude(amount=13.022597399, mode=Mode.PRIVATE)
    chamfer1_piece_10b = split(chamfer1_piece_10b, bisect_by=Plane(origin=(4.2, 17.035605903, 3.08553508), z_dir=(-1, 0, 0)), keep=Keep.TOP, mode=Mode.PRIVATE)
    chamfer1_piece_10b = split(chamfer1_piece_10b, bisect_by=Plane(origin=(2.330247274, 18.1, 3.08553508), z_dir=(0, -1, 0)), keep=Keep.TOP, mode=Mode.PRIVATE)
    chamfer1_piece_10b = chamfer1_piece_10b - Plane(origin=(0.7, 17.035605903, 0), x_dir=(0, 0, 1), z_dir=(0, 1, 0)) * Cylinder(3, 33, mode=Mode.PRIVATE)
    chamfer1_piece_10 = chamfer1_piece_10a & chamfer1_piece_10b
    add(chamfer1_piece_10)
    with BuildSketch(Plane(origin=(-2.8, 16.4, -12.15073632), x_dir=(-0.027495876610586365, 0.9996219169112968, 0), z_dir=(0, 0, 1))) as chamfer1_piece_11a_section:
        Polygon((CHAMFER1_SIZE * 0.999621916911, -CHAMFER1_SIZE * 0.0274958766106), (-CHAMFER1_SIZE * 0.0274958766106, -CHAMFER1_SIZE * 0.999621916911), (0, 0), align=None)
    chamfer1_piece_11a = extrude(amount=13.022597399, mode=Mode.PRIVATE)
    chamfer1_piece_11a = split(chamfer1_piece_11a, bisect_by=Plane(origin=(-2.385534958, 18.1, -1.63024723), z_dir=(0, -1, 0)), keep=Keep.TOP, mode=Mode.PRIVATE)
    chamfer1_piece_11a = split(chamfer1_piece_11a, bisect_by=Plane(origin=(-2.385534958, 17.035605809, -3.5), z_dir=(0, 0, 1)), keep=Keep.TOP, mode=Mode.PRIVATE)
    chamfer1_piece_11a = chamfer1_piece_11a - Plane(origin=(0.7, 17.035605809, 0), x_dir=(0, 0, 1), z_dir=(0, 1, 0)) * Cylinder(3, 33, mode=Mode.PRIVATE)
    with BuildSketch(Plane(origin=(1.57186108, 16.4, -3.5), x_dir=(0, 0.9996219169112968, -0.027495876610586365), z_dir=(-1, 0, 0))) as chamfer1_piece_11b_section:
        Polygon((CHAMFER1_SIZE * 0.999621916911, -CHAMFER1_SIZE * 0.0274958766106), (-CHAMFER1_SIZE * 0.0274958766106, -CHAMFER1_SIZE * 0.999621916911), (0, 0), align=None)
    chamfer1_piece_11b = extrude(amount=13.022597399, mode=Mode.PRIVATE)
    chamfer1_piece_11b = split(chamfer1_piece_11b, bisect_by=Plane(origin=(-2.8, 17.035605902, -3.085535078), z_dir=(1, 0, 0)), keep=Keep.TOP, mode=Mode.PRIVATE)
    chamfer1_piece_11b = split(chamfer1_piece_11b, bisect_by=Plane(origin=(-0.930247283, 18.1, -3.085535078), z_dir=(0, -1, 0)), keep=Keep.TOP, mode=Mode.PRIVATE)
    chamfer1_piece_11b = chamfer1_piece_11b - Plane(origin=(0.7, 17.035605902, 0), x_dir=(0, 0, 1), z_dir=(0, 1, 0)) * Cylinder(3, 33, mode=Mode.PRIVATE)
    chamfer1_piece_11 = chamfer1_piece_11a & chamfer1_piece_11b
    add(chamfer1_piece_11)
    with BuildSketch(Plane(origin=(-11.45073632, 16.4, 3.5), x_dir=(0, 0.9996219169112968, 0.027495876610586365), z_dir=(1, 0, 0))) as chamfer1_piece_12a_section:
        Polygon((CHAMFER1_SIZE * 0.999621916911, -CHAMFER1_SIZE * 0.0274958766106), (-CHAMFER1_SIZE * 0.0274958766106, -CHAMFER1_SIZE * 0.999621916911), (0, 0), align=None)
    chamfer1_piece_12a = extrude(amount=13.022597399, mode=Mode.PRIVATE)
    chamfer1_piece_12a = split(chamfer1_piece_12a, bisect_by=Plane(origin=(-0.930247276, 18.1, 3.08553506), z_dir=(0, -1, 0)), keep=Keep.TOP, mode=Mode.PRIVATE)
    chamfer1_piece_12a = split(chamfer1_piece_12a, bisect_by=Plane(origin=(-2.8, 17.035605889, 3.08553506), z_dir=(1, 0, 0)), keep=Keep.TOP, mode=Mode.PRIVATE)
    chamfer1_piece_12a = chamfer1_piece_12a - Plane(origin=(0.7, 17.035605889, 0), x_dir=(0, 0, 1), z_dir=(0, 1, 0)) * Cylinder(3, 33, mode=Mode.PRIVATE)
    with BuildSketch(Plane(origin=(-2.8, 16.4, -0.87186108), x_dir=(-0.027495876610586365, 0.9996219169112968, 0), z_dir=(0, 0, 1))) as chamfer1_piece_12b_section:
        Polygon((CHAMFER1_SIZE * 0.999621916911, -CHAMFER1_SIZE * 0.0274958766106), (-CHAMFER1_SIZE * 0.0274958766106, -CHAMFER1_SIZE * 0.999621916911), (0, 0), align=None)
    chamfer1_piece_12b = extrude(amount=13.022597399, mode=Mode.PRIVATE)
    chamfer1_piece_12b = split(chamfer1_piece_12b, bisect_by=Plane(origin=(-2.385535078, 17.035605902, 3.5), z_dir=(0, 0, -1)), keep=Keep.TOP, mode=Mode.PRIVATE)
    chamfer1_piece_12b = split(chamfer1_piece_12b, bisect_by=Plane(origin=(-2.385535078, 18.1, 1.630247283), z_dir=(0, -1, 0)), keep=Keep.TOP, mode=Mode.PRIVATE)
    chamfer1_piece_12b = chamfer1_piece_12b - Plane(origin=(0.7, 17.035605902, 0), x_dir=(0, 0, 1), z_dir=(0, 1, 0)) * Cylinder(3, 33, mode=Mode.PRIVATE)
    chamfer1_piece_12 = chamfer1_piece_12a & chamfer1_piece_12b
    add(chamfer1_piece_12)

    # Chamfer2
    chamfer2_edges = [part.edges().sort_by_distance(p)[0] for p in [
        (-2.3, 16.4, 0),
        (1.648683298, 16.4, 2.846049894),
        (3.7, 16.4, 0),
        (0.7, 16.4, -3),
    ]]
    chamfer(chamfer2_edges, length=CHAMFER2_SIZE)


solid = part.part
